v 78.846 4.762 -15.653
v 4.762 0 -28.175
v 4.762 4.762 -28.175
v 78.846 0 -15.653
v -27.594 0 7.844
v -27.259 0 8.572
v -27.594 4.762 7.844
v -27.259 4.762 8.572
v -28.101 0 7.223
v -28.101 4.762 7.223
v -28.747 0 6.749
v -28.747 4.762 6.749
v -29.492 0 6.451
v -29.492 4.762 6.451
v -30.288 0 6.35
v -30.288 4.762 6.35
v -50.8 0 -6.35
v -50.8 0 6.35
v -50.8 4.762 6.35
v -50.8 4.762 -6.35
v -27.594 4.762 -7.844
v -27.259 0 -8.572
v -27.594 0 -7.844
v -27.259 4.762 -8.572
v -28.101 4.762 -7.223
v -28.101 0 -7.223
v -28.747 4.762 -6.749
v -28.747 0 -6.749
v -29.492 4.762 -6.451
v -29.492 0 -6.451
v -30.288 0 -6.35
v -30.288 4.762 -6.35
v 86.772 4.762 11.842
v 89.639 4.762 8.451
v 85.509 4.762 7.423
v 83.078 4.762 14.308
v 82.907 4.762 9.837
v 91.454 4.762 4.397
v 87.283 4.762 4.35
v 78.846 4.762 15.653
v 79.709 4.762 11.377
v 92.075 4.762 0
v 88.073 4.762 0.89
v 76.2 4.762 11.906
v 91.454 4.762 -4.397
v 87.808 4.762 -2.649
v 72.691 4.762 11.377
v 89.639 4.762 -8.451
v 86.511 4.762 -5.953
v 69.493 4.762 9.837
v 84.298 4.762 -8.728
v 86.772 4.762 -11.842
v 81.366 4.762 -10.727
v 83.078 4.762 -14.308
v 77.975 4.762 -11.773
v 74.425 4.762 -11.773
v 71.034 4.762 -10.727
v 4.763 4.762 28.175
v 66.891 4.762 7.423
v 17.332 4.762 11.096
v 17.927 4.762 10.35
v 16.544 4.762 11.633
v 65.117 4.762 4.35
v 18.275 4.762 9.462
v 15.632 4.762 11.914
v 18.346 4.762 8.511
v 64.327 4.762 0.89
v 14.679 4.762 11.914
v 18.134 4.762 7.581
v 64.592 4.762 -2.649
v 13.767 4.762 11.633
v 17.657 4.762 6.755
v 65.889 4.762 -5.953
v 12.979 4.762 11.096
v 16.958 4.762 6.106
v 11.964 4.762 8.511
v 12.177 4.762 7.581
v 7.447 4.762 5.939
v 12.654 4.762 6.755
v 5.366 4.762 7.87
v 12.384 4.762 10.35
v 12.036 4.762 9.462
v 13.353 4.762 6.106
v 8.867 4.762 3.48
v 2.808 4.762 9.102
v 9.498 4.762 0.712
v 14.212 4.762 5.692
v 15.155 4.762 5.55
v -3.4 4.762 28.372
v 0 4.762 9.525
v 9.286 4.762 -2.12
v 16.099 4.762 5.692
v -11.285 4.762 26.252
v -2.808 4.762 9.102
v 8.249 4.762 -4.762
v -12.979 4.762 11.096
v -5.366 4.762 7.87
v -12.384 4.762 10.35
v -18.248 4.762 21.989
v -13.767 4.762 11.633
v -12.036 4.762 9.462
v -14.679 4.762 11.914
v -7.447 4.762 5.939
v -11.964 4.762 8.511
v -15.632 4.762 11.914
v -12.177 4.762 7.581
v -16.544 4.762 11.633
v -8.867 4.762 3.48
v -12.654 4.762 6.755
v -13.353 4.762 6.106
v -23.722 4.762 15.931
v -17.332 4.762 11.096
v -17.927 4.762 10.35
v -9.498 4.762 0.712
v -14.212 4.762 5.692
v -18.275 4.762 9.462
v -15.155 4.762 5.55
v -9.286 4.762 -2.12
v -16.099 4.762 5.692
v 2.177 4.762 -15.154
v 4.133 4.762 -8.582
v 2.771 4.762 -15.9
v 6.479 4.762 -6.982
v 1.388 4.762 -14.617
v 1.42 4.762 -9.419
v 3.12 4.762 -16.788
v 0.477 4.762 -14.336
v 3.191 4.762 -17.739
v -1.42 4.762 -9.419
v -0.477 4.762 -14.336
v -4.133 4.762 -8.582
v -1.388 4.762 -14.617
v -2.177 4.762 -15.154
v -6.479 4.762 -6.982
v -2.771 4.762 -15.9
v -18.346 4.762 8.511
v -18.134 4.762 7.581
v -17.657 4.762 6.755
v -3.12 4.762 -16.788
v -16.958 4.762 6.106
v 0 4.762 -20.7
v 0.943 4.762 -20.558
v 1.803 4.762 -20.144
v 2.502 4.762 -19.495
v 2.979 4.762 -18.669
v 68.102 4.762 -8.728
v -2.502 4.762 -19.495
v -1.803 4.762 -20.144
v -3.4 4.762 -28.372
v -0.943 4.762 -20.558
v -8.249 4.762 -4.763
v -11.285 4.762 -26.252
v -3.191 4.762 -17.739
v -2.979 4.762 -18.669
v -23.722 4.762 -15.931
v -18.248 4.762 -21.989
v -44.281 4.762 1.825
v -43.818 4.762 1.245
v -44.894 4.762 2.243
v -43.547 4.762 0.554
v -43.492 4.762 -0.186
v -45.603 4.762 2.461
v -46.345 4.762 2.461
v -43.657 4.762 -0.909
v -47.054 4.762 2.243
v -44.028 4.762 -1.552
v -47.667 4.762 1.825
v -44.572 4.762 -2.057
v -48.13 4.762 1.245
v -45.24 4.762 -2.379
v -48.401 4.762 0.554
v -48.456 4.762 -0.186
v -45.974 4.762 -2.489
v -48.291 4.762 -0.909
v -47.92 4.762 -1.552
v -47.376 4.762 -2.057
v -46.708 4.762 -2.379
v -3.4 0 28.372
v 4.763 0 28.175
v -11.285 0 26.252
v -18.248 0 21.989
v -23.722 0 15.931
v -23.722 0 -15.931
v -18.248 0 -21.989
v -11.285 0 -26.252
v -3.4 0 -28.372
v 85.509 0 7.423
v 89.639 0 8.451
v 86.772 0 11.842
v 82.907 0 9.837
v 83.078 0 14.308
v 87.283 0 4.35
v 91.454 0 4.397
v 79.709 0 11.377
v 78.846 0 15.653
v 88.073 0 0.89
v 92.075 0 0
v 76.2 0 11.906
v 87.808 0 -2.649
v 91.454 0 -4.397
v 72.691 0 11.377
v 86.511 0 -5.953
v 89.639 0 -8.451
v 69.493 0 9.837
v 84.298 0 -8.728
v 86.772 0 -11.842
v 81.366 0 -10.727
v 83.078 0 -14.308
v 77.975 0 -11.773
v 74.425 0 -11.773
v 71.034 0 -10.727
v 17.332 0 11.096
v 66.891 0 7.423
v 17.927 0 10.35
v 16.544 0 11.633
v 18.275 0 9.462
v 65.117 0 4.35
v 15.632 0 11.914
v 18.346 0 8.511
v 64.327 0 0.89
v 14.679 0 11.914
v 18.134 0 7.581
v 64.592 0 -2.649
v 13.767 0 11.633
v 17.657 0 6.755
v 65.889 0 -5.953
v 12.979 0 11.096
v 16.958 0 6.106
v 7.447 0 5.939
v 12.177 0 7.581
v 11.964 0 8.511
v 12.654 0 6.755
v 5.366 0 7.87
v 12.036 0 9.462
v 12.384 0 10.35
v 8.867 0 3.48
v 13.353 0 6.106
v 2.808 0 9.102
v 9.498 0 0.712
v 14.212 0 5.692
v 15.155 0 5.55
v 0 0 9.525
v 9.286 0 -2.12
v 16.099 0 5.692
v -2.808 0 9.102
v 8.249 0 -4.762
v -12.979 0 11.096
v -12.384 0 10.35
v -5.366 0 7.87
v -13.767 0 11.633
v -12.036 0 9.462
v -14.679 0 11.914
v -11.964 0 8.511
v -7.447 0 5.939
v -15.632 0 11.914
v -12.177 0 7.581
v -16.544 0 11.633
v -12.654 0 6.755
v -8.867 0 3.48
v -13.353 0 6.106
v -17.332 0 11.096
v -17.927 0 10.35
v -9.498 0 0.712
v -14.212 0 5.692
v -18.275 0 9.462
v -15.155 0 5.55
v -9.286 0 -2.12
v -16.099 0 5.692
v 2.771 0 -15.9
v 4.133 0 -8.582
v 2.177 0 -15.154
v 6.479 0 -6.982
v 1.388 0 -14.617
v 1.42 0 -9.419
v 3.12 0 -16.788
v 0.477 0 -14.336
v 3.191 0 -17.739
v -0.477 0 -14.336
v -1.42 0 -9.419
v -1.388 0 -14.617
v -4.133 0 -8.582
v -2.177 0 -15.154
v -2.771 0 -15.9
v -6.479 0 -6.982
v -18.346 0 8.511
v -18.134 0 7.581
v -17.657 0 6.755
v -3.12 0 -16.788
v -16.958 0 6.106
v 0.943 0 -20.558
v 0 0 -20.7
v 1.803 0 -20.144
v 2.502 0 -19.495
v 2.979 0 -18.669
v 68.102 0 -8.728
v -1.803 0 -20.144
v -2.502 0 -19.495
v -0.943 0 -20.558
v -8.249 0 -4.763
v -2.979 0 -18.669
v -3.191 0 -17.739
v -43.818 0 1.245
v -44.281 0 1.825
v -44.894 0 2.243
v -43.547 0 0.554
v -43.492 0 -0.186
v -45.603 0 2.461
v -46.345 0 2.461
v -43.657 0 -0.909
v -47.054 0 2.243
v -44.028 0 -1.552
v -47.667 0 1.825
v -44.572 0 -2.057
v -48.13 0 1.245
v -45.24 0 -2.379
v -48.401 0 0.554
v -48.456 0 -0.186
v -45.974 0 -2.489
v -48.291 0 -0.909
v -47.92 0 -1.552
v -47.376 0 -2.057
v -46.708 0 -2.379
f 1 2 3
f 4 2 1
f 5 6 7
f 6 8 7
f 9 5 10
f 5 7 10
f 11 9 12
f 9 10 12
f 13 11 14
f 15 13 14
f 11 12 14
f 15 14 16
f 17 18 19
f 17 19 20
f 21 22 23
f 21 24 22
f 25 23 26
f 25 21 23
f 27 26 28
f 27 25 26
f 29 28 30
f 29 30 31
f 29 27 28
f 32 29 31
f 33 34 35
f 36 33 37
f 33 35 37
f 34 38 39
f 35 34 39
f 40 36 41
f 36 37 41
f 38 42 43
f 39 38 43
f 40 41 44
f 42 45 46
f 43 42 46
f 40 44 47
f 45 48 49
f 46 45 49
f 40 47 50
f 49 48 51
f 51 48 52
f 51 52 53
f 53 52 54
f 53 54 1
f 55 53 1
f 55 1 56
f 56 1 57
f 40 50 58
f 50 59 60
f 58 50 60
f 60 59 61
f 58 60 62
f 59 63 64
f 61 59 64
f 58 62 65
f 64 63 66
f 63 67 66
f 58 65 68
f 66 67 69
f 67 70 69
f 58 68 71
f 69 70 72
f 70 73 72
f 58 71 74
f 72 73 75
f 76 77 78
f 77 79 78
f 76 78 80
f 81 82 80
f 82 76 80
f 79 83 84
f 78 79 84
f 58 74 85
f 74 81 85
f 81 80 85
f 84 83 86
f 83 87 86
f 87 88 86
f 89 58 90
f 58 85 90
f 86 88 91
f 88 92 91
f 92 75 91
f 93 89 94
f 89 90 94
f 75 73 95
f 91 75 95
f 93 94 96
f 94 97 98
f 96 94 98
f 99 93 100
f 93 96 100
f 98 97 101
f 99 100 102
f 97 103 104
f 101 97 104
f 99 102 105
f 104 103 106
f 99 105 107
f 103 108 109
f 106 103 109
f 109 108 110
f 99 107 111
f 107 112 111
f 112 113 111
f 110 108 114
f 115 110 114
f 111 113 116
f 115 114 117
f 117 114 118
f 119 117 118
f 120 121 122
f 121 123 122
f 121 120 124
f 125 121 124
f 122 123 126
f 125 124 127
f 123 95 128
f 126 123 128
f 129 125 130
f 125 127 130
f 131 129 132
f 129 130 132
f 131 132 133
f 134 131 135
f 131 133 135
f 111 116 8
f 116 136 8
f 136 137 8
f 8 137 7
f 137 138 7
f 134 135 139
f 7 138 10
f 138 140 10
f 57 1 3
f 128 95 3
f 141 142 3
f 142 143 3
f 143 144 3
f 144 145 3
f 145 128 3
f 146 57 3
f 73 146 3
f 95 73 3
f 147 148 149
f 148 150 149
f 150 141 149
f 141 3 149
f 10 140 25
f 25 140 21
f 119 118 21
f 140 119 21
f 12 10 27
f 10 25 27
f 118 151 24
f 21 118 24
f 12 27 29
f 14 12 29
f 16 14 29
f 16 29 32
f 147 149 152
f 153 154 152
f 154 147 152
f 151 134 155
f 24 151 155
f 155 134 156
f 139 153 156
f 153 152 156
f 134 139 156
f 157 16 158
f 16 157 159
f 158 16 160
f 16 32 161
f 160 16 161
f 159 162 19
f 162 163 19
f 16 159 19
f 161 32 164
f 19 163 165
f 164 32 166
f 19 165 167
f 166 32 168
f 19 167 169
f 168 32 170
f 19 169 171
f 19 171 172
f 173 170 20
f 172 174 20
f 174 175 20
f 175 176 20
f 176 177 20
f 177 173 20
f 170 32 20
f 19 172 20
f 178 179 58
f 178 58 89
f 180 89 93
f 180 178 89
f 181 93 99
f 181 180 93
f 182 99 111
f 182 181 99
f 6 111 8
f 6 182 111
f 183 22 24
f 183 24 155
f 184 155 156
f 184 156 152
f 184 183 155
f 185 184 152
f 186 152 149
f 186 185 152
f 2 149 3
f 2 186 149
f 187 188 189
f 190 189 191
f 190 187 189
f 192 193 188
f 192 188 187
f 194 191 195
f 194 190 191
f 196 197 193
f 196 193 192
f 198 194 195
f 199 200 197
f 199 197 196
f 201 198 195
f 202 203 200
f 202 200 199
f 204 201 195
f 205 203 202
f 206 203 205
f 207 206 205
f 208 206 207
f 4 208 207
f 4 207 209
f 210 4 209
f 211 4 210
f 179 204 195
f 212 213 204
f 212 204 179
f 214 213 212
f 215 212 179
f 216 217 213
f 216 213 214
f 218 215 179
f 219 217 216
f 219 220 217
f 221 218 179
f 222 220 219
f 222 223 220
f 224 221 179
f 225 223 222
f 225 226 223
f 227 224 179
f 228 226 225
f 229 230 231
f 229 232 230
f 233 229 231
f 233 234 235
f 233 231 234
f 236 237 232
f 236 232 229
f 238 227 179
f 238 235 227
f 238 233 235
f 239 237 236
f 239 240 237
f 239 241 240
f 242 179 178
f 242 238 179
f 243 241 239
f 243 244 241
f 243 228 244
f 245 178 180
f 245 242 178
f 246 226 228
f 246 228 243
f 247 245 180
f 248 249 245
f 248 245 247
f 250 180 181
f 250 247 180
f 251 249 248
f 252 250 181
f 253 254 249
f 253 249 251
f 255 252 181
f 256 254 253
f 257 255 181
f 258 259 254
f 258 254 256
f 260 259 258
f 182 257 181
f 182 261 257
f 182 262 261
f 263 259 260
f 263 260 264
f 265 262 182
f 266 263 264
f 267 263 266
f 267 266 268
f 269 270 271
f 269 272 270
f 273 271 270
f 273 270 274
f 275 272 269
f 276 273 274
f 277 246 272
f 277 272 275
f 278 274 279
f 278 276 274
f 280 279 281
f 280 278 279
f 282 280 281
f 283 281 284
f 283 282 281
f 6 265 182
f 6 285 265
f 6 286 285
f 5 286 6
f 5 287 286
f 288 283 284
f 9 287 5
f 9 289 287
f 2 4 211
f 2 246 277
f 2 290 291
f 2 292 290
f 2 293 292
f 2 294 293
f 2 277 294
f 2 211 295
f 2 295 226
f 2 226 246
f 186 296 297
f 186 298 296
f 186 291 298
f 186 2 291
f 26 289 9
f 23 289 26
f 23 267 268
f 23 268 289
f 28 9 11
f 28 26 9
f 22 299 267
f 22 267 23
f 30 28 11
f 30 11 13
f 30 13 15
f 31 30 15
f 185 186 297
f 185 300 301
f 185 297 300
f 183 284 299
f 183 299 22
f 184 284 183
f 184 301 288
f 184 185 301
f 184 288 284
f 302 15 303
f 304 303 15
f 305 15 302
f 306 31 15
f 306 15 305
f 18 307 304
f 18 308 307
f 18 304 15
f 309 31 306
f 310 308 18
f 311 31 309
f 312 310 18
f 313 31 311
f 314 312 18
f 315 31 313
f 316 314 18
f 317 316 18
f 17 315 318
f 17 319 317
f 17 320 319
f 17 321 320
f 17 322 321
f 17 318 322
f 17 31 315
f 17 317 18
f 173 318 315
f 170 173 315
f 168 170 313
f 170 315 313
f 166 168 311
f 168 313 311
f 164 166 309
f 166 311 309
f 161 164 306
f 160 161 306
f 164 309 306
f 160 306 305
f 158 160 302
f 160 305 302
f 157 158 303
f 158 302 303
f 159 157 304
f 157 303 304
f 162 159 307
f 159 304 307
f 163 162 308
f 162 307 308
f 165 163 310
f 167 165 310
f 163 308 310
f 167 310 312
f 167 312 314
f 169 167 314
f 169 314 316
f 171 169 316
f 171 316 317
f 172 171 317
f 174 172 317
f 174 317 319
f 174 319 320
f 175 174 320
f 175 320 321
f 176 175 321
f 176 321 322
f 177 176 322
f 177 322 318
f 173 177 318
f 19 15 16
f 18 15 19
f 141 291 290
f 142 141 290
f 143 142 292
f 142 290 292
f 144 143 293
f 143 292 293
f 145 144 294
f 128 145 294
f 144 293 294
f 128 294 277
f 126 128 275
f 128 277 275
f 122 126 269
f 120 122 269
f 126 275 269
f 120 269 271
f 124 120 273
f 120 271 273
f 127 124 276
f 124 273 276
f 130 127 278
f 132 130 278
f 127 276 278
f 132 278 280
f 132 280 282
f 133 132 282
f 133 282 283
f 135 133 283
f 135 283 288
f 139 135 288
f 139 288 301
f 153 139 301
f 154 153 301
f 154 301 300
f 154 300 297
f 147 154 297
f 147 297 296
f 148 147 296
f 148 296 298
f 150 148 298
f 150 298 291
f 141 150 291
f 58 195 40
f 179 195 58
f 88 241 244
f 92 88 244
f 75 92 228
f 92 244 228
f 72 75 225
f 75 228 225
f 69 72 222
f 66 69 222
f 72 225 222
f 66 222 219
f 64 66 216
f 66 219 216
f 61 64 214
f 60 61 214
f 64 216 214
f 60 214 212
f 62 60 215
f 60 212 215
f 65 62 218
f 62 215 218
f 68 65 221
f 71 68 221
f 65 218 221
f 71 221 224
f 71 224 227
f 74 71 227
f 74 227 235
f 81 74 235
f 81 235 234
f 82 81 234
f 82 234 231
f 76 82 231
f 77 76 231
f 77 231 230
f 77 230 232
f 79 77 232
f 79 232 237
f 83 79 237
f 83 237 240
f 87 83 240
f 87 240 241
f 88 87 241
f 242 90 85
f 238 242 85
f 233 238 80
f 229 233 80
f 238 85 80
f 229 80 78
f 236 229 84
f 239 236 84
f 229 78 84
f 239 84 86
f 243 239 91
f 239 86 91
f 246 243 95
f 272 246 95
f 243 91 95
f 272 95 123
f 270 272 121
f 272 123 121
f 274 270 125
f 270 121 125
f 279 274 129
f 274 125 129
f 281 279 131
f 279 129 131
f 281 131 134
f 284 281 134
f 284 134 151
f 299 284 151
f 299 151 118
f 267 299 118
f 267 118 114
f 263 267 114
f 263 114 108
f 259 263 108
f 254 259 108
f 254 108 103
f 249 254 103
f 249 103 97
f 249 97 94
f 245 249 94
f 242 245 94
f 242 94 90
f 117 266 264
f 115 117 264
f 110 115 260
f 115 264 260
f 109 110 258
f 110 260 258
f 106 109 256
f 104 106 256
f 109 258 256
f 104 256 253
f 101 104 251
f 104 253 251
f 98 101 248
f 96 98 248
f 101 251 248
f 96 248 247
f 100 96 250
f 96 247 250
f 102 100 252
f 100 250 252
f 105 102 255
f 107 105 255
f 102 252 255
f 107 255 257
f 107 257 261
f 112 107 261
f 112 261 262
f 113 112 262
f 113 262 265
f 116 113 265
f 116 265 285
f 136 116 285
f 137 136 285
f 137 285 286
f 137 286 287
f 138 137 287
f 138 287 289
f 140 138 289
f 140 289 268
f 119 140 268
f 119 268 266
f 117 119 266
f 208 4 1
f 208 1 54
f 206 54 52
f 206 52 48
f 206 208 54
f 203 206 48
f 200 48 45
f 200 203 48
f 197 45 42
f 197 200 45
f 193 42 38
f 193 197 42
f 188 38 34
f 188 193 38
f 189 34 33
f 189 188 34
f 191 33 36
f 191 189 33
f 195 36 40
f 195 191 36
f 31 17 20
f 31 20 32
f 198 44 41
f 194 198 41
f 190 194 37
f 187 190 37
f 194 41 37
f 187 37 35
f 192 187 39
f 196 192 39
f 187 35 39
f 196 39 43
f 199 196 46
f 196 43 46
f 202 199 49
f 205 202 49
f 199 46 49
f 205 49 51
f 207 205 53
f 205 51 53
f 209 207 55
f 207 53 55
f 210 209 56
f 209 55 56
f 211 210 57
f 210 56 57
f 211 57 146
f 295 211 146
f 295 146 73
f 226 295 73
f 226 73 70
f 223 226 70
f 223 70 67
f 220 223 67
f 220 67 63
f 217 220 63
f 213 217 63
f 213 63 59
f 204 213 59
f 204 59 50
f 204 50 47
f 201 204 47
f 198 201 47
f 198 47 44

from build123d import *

# Parameters (mm, degrees)
BOSS_EXTRUDE1_DEPTH        = 4.7625
SKETCH2_R                  = 11.90625
CUT_EXTRUDE1_DEPTH         = 97.524699721
M6_CLEARANCE_HOLE1_D       = 6.4
SKETCH5_R                  = 9.525
CUT_EXTRUDE2_DEPTH         = 97.524699721
FILLET1_R                  = 3.175
F_10_CLEARANCE_HOLE1_D     = 4.9784
F_10_CLEARANCE_HOLE1_DEPTH = 9.525
F_10_CLEARANCE_HOLE1_TIP   = 1.495662253


with BuildPart() as part:
    # Sketch1 → Boss-Extrude1 (new body)
    with BuildSketch(Plane(origin=(0, 0, 0), x_dir=(1, 0, 0), z_dir=(0, 1, 0))):
        with BuildLine():
            Line((4.7625, 28.175329967), (78.845833333, 15.652961093))
            ThreePointArc((78.845833333, 15.652961093), (92.075, 0), (78.845833333, -15.652961093))
            Line((78.845833333, -15.652961093), (4.7625, -28.175329967))
            ThreePointArc((4.7625, -28.175329967), (-15.889172282, -23.750049035), (-27.86051193, -6.35))
            Line((-27.86051193, -6.35), (-50.8, -6.35))
            Line((-50.8, -6.35), (-50.8, 6.35))
            Line((-50.8, 6.35), (-27.86051193, 6.35))
            ThreePointArc((-27.86051193, 6.35), (-15.889172282, 23.750049035), (4.7625, 28.175329967))
        make_face()
    extrude(amount=BOSS_EXTRUDE1_DEPTH)

    # Sketch2 → Cut-Extrude1 (cut, through all)
    with BuildSketch(Plane(origin=(0, 4.7625, 0), x_dir=(1, 0, 0), z_dir=(0, 1, 0))):
        with Locations(Location((76.2, 0, 0), (0, 0, 270))):
            Circle(SKETCH2_R)
    extrude(amount=-CUT_EXTRUDE1_DEPTH, mode=Mode.SUBTRACT)

    # M6 Clearance Hole1 (through all)
    with Locations(Plane(origin=(0, 4.7625, -17.5), x_dir=(0, 0, 1), z_dir=(0, 1, 0))):
        with Locations((0, 0), (26.25, -15.155444566), (26.25, 15.155444566)):
            Hole(M6_CLEARANCE_HOLE1_D / 2)

    # Sketch5 → Cut-Extrude2 (cut, through all)
    with BuildSketch(Plane(origin=(0, 4.7625, 0), x_dir=(1, 0, 0), z_dir=(0, 1, 0))):
        with Locations(Location((0, 0, 0), (0, 0, 270))):
            Circle(SKETCH5_R)
    extrude(amount=-CUT_EXTRUDE2_DEPTH, mode=Mode.SUBTRACT)

    # Fillet1
    fillet1_edges = [part.edges().sort_by_distance(p)[0] for p in [
        (-27.86051193, 2.38125, 6.35),
        (-27.86051193, 2.38125, -6.35),
    ]]
    fillet(fillet1_edges, radius=FILLET1_R)

    # #10 Clearance Hole1
    with Locations(Plane(origin=(-45.974, 4.7625, 0), x_dir=(0, 0, 1), z_dir=(0, 1, 0))):
        with Locations((0, 0)):
            Hole(F_10_CLEARANCE_HOLE1_D / 2, depth=F_10_CLEARANCE_HOLE1_DEPTH)
            with Locations((0, 0, -(F_10_CLEARANCE_HOLE1_DEPTH + F_10_CLEARANCE_HOLE1_TIP / 2))):  # 118° drill point
                Cone(0, F_10_CLEARANCE_HOLE1_D / 2, F_10_CLEARANCE_HOLE1_TIP, mode=Mode.SUBTRACT)


solid = part.part
